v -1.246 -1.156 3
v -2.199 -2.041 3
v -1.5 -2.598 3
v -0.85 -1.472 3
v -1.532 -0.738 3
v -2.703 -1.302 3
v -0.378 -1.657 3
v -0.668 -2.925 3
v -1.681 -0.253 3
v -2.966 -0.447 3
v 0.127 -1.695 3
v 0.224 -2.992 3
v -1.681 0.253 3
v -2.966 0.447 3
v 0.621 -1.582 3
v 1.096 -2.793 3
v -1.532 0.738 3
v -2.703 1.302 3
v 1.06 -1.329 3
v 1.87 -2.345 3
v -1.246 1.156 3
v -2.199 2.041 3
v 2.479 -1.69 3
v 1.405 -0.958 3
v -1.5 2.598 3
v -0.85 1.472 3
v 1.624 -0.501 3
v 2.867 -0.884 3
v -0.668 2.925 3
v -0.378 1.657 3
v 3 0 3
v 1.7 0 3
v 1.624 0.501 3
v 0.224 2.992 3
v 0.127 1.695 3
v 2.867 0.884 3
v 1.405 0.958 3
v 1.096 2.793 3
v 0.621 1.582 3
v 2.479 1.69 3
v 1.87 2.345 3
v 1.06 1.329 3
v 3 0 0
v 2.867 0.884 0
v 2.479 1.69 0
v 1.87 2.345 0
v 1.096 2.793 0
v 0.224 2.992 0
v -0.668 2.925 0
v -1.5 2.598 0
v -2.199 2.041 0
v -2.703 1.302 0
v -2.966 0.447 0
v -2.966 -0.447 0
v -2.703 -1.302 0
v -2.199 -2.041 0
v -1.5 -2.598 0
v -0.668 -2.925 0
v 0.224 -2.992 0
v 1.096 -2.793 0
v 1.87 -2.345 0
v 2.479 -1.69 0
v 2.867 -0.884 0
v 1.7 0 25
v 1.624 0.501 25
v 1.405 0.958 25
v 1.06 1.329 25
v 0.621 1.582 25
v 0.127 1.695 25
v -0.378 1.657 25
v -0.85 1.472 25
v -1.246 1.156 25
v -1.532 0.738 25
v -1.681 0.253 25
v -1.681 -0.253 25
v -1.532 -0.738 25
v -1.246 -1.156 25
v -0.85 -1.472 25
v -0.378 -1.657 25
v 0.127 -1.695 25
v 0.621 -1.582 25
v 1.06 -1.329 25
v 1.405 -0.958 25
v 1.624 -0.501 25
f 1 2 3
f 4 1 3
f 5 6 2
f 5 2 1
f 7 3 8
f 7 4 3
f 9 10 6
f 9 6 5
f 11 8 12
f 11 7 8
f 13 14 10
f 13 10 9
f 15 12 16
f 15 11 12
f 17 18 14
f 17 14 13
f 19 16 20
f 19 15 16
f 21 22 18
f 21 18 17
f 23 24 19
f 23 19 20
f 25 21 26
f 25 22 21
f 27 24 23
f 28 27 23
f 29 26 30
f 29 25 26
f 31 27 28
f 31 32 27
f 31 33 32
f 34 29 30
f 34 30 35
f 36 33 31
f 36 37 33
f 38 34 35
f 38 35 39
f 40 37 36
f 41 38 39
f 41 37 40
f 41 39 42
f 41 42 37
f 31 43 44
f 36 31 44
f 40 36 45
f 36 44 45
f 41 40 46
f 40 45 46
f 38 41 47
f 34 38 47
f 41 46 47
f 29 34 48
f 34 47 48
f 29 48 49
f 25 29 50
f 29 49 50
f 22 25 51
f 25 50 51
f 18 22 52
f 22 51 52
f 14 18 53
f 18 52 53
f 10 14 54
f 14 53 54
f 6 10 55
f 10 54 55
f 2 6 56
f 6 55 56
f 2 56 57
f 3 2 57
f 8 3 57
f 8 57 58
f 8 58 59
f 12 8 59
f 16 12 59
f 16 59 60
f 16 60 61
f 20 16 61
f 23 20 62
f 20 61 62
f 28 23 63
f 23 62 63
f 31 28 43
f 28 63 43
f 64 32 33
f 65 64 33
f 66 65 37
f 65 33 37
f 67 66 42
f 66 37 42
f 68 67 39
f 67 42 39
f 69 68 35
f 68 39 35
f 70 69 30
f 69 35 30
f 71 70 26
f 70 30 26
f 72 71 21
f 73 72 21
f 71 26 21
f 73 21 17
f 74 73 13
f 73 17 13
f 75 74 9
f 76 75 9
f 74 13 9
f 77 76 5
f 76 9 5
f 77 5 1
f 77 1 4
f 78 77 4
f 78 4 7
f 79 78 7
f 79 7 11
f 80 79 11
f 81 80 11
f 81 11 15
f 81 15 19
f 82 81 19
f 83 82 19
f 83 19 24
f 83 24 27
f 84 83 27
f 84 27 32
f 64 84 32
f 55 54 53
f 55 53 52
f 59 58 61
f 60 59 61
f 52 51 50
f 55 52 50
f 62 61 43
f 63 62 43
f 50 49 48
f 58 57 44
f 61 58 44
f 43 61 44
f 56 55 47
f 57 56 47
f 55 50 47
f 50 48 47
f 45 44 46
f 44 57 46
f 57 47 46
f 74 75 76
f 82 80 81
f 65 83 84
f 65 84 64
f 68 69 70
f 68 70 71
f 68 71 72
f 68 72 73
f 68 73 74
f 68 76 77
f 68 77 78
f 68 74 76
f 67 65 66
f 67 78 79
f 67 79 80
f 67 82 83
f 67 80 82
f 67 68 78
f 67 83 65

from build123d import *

# Parameters (mm, degrees)
CYLINDER002_R     = 3
CYLINDER002_DEPTH = 3
CYLINDER001_R     = 1.7
CYLINDER001_DEPTH = 25


with BuildPart() as cylinder002:
    # Cylinder002 → Cylinder002 (new body)
    with BuildSketch(Plane.XY):
        Circle(CYLINDER002_R)
    extrude(amount=CYLINDER002_DEPTH)


with BuildPart() as screw:
    # Cylinder001 → Cylinder001 (new body)
    with BuildSketch(Plane.XY):
        Circle(CYLINDER001_R)
    extrude(amount=CYLINDER001_DEPTH)

    # Fusion: union Cylinder002
    add(cylinder002.part)


solid = screw.part
